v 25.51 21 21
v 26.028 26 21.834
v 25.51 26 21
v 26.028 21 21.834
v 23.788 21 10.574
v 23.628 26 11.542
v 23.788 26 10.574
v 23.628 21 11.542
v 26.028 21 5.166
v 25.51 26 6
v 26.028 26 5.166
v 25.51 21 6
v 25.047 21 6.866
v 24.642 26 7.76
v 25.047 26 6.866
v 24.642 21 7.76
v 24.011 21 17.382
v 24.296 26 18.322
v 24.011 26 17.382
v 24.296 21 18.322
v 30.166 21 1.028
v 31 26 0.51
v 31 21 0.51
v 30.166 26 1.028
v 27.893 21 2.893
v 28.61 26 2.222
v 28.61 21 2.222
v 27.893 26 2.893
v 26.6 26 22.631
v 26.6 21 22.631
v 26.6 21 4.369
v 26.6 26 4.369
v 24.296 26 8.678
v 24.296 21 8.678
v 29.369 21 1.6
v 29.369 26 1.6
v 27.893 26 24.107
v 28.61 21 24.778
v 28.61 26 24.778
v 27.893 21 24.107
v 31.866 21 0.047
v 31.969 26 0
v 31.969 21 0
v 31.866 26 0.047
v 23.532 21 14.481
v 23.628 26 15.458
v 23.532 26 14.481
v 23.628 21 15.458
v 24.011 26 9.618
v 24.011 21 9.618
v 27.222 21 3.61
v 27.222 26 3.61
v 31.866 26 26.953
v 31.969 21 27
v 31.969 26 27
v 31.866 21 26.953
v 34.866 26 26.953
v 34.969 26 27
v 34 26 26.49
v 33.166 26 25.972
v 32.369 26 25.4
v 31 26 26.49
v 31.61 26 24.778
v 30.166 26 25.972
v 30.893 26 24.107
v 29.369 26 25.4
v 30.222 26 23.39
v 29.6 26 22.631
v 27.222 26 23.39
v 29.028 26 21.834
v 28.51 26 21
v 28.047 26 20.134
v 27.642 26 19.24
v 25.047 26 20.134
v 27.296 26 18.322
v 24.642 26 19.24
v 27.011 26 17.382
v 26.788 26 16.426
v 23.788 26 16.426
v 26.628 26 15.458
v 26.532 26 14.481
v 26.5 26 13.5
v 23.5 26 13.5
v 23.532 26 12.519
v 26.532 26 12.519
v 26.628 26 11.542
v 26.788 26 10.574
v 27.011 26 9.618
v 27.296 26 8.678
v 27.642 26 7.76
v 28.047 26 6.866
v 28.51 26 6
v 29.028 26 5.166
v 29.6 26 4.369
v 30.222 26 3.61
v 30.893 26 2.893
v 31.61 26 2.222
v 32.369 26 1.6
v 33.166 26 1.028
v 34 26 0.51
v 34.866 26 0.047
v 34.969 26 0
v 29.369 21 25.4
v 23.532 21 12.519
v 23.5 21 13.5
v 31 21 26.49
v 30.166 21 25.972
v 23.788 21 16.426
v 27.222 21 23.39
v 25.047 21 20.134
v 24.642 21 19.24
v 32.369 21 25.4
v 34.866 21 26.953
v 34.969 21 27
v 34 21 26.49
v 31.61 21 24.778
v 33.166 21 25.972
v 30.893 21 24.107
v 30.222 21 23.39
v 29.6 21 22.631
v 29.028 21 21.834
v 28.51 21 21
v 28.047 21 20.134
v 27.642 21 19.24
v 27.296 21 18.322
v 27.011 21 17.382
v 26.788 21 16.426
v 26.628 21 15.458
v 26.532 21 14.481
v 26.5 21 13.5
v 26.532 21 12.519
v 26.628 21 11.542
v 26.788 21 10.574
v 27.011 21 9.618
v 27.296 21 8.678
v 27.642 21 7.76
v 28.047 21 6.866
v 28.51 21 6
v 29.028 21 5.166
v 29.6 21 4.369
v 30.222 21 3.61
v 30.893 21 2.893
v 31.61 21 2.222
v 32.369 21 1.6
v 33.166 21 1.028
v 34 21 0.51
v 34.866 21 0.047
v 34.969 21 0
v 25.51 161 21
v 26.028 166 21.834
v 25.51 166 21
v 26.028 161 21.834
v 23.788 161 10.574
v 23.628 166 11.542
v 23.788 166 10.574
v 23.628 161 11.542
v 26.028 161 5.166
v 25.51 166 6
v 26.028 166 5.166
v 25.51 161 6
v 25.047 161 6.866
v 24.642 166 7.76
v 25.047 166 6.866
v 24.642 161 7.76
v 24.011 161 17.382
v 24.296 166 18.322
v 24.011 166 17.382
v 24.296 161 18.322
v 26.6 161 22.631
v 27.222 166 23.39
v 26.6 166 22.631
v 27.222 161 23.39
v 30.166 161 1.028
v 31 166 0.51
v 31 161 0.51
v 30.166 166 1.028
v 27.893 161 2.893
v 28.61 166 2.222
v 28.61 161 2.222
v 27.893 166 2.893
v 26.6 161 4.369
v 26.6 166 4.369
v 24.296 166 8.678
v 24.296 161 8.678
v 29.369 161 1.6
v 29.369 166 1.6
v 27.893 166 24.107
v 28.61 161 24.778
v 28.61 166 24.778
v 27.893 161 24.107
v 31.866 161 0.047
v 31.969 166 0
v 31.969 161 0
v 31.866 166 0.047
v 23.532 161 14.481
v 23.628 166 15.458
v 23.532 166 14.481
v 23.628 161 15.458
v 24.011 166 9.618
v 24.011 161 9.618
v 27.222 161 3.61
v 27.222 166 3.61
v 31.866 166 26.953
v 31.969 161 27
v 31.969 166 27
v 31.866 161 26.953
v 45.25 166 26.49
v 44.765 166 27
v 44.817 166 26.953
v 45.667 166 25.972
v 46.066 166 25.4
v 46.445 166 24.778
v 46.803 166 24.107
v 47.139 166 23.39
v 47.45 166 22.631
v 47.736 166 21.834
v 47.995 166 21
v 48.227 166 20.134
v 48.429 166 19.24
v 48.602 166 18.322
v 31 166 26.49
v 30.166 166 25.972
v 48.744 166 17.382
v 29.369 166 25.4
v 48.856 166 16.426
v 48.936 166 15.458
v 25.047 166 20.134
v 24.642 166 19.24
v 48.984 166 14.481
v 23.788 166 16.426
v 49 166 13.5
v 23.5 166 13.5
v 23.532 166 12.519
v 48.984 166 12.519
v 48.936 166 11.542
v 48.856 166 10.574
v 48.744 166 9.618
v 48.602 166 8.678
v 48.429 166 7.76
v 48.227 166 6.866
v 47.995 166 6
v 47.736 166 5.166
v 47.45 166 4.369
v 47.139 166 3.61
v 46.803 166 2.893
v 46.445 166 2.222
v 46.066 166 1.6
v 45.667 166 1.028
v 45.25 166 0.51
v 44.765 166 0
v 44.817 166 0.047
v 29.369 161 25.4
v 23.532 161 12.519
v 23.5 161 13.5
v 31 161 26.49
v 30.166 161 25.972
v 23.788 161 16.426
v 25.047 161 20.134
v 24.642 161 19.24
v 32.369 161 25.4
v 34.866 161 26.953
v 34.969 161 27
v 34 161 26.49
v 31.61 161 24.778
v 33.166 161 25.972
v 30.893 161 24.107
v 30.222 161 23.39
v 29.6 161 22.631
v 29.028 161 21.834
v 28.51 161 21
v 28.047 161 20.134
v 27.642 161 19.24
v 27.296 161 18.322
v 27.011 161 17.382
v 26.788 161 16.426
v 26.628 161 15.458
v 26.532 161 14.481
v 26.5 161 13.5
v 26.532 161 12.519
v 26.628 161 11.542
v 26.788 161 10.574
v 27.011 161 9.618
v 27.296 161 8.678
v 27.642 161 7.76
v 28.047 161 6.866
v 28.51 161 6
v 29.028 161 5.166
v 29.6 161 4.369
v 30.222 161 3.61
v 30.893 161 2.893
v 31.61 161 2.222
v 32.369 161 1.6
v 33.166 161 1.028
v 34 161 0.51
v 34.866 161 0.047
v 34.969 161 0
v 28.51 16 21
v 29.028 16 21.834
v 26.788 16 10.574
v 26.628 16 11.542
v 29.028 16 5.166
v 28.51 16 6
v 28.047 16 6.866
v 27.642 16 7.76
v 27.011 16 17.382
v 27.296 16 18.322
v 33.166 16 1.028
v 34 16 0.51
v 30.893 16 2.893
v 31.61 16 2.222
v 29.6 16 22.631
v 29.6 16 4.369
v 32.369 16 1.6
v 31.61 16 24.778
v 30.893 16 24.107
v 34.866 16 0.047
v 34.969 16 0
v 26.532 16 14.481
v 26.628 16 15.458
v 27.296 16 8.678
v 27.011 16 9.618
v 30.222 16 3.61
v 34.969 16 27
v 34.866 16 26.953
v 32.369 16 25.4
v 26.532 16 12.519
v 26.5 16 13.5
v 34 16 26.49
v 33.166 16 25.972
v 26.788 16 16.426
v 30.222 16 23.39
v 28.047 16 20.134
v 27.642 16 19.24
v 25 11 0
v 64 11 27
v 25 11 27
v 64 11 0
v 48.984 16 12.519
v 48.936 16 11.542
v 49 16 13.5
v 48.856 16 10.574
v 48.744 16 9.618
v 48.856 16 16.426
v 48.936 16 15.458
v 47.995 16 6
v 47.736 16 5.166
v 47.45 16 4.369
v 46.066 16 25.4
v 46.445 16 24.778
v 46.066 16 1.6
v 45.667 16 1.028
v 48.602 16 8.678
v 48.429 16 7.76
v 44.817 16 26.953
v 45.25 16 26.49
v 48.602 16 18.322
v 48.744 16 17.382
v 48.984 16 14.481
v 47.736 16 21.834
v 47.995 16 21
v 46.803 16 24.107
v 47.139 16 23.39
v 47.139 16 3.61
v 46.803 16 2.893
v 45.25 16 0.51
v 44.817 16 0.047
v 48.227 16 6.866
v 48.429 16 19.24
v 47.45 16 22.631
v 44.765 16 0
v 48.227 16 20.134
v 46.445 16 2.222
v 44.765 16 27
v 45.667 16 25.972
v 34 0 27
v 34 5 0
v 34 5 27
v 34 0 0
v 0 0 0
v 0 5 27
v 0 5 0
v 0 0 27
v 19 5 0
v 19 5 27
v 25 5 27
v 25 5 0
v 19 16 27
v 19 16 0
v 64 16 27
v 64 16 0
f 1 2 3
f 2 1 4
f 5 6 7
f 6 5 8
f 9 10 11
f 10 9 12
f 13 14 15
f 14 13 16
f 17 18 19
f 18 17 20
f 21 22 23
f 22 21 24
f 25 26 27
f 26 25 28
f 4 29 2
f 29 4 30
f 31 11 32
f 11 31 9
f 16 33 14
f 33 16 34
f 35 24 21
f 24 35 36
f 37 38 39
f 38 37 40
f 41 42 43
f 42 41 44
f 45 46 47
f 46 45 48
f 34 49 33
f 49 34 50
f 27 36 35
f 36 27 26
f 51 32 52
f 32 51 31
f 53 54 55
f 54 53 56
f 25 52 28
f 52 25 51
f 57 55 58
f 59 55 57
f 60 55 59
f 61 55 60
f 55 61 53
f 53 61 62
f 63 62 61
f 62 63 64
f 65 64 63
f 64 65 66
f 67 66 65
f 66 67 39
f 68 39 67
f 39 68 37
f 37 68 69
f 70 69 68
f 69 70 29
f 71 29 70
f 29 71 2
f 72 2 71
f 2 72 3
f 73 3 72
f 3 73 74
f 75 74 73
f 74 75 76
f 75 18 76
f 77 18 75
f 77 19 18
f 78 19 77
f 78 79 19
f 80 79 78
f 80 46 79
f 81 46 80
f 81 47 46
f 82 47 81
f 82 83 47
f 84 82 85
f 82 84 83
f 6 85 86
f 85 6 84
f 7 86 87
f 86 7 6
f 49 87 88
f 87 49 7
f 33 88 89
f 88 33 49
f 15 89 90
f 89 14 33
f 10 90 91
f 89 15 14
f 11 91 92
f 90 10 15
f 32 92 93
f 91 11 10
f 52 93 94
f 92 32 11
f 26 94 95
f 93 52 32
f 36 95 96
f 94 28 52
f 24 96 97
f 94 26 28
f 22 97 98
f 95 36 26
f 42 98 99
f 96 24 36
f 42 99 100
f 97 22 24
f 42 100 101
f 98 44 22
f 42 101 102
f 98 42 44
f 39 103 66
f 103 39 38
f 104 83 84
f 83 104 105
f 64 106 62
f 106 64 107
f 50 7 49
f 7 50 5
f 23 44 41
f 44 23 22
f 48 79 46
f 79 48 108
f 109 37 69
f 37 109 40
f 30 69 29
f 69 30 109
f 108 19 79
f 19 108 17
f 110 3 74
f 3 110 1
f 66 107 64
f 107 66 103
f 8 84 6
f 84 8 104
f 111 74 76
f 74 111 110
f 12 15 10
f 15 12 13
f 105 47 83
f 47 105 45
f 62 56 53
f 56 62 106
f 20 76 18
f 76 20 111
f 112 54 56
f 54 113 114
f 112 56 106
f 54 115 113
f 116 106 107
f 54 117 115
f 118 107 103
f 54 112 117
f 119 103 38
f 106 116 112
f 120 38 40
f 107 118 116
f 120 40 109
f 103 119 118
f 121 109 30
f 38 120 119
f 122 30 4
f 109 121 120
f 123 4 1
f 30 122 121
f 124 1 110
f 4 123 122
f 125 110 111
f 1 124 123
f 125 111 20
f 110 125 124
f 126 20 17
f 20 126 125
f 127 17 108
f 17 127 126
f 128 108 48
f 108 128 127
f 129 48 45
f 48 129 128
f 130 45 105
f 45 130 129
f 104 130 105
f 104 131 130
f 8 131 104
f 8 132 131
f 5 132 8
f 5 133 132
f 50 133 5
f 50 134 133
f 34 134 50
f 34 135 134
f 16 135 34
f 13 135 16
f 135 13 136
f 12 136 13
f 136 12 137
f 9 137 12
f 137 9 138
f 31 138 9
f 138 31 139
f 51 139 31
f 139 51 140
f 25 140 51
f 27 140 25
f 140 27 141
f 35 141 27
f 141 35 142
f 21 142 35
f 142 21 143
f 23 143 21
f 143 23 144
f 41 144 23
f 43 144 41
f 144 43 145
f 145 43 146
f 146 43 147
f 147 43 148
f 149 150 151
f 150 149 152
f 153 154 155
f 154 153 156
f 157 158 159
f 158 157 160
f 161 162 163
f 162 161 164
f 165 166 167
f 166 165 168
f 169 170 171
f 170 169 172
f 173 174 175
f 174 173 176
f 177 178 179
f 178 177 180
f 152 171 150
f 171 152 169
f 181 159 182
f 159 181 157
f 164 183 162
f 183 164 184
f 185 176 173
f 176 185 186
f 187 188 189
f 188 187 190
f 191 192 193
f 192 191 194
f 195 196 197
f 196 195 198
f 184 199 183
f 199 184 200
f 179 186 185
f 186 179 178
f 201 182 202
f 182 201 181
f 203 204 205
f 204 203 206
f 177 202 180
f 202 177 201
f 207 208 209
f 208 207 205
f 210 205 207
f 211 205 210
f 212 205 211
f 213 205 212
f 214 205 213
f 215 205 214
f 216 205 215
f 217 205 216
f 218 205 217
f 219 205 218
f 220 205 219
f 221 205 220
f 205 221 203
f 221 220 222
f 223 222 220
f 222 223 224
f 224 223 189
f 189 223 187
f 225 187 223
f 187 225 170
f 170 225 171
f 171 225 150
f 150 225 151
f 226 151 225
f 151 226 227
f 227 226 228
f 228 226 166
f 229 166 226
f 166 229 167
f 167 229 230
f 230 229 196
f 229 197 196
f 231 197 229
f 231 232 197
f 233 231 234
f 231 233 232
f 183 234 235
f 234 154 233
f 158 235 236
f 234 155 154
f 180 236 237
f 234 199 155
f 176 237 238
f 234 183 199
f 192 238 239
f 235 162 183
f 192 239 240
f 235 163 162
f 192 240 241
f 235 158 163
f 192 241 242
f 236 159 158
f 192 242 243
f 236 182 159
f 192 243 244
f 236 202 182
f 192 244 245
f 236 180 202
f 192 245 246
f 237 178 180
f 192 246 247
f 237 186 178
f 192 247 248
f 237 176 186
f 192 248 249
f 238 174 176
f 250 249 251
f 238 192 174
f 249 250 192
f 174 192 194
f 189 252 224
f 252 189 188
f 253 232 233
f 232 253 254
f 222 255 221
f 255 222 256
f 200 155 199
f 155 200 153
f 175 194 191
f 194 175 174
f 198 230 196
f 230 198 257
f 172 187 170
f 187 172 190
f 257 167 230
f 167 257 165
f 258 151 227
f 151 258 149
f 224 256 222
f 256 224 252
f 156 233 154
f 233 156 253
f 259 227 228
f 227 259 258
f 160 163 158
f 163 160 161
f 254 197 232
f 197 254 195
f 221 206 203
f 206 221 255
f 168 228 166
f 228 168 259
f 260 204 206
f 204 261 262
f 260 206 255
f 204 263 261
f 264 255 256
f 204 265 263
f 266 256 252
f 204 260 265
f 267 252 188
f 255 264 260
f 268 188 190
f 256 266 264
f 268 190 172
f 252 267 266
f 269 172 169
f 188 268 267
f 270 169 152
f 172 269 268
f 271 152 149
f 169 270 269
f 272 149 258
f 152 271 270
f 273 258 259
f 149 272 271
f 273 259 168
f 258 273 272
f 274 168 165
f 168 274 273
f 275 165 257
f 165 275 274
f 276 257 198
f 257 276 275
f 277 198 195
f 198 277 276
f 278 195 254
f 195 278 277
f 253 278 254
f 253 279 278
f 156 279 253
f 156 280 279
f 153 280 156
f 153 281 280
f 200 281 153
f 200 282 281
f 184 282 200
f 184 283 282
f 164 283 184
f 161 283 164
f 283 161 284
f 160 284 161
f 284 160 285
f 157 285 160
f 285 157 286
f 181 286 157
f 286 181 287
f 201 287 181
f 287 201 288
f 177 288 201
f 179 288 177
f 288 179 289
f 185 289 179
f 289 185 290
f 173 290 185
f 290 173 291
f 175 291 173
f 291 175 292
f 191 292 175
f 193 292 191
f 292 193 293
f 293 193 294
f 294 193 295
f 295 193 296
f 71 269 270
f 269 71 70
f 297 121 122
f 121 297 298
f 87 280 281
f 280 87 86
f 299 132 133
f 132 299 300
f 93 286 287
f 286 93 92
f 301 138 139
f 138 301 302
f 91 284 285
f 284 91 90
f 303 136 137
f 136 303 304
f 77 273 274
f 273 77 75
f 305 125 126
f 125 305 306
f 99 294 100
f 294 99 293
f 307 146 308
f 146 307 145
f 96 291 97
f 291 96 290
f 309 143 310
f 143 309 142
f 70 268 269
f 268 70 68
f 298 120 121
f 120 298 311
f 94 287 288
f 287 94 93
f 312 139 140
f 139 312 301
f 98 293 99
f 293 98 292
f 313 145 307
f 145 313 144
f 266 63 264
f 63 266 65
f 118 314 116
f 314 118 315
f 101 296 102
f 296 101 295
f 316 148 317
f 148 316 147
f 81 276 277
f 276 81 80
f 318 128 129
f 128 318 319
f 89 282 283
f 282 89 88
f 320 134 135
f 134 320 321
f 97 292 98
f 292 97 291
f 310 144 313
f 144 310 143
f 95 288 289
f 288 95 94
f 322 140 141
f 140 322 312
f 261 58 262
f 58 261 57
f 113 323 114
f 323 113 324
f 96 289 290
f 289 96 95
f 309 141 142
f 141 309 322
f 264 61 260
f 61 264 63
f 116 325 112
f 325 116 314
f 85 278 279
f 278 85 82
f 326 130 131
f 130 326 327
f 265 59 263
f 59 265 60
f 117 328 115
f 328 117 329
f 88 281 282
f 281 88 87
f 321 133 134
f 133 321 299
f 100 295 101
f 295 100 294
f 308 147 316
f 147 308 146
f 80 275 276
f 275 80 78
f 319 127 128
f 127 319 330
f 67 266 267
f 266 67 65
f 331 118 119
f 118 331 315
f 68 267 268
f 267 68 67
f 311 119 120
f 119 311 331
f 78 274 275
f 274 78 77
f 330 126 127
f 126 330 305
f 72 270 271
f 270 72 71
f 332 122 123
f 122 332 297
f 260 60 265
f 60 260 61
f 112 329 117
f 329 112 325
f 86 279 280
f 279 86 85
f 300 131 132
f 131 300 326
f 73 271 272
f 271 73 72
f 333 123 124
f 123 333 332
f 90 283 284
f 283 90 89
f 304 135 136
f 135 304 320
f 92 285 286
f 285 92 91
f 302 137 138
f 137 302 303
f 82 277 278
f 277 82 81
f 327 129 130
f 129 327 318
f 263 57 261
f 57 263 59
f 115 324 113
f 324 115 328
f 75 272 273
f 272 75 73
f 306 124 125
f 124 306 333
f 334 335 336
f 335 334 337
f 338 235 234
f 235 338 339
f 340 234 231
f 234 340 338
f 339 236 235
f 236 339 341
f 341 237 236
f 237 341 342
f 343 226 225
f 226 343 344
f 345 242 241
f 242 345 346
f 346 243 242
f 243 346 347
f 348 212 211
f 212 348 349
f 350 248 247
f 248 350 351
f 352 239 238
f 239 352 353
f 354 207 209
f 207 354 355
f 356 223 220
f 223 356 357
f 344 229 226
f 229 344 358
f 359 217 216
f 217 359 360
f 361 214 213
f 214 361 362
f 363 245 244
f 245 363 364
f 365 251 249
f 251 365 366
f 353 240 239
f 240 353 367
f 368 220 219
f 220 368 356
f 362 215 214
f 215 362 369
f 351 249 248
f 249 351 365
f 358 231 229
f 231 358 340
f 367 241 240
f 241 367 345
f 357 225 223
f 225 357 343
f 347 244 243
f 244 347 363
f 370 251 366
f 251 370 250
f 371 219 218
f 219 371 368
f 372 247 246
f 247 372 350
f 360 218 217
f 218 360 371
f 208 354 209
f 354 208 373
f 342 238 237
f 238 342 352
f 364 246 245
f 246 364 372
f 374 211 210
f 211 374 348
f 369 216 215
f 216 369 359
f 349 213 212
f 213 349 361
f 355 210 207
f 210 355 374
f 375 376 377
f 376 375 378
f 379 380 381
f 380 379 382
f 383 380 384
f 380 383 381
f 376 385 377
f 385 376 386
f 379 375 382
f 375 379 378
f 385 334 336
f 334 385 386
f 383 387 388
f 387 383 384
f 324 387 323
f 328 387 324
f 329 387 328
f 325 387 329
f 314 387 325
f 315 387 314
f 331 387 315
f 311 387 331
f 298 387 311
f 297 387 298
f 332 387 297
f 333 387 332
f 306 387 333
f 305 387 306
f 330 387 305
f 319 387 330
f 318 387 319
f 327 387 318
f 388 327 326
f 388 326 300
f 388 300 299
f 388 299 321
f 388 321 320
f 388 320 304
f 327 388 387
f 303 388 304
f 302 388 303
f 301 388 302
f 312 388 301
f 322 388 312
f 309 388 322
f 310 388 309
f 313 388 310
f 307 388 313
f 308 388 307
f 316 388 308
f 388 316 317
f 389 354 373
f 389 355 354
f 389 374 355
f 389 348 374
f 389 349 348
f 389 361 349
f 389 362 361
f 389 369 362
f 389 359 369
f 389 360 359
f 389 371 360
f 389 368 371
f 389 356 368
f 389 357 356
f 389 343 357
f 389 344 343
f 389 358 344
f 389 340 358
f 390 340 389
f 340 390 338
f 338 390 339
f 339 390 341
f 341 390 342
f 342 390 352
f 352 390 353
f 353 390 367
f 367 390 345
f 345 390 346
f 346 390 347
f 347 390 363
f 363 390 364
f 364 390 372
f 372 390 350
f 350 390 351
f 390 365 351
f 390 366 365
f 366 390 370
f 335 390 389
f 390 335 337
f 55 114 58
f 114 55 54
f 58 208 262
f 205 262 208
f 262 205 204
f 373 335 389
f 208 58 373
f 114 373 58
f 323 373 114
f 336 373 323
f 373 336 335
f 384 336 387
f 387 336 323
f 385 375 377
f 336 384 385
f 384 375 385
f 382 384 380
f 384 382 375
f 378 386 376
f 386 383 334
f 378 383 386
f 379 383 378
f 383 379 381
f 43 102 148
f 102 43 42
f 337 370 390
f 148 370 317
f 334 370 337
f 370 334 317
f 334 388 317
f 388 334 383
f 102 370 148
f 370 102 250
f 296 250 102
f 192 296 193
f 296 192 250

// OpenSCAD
// [FL_INDEX: keywords="openscad, 3d_parametric, Customizable_Spool_Holder_for_Replicator_2, csg_solid" | COT="Parametric OpenSCAD design from 3DCodeverse"]
// Title: Customizable Spool Holder for Replicator 2

// Parametric spool holder for MBI R2 by Woale

// preview[view:north west, tilt:top diagonal]

// Unit
unit = 1; // [1:mm,25.4:inch]

// How long should the spool holder be (between ribbons) ?
spool_width = 130;

// What's the size of the spool hole ?
spool_hole_diameter = 30;

//variables
spl_l=spool_width*unit;
spl_d=spool_hole_diameter*unit;

//fix
$fn=48*2;
spl_r=spl_d/2*1;
plt_w=spl_d*1.5*1;

//plate holder
module plt_hld()
{
	//box1
	cube([34,5,spl_d]);
	//box2
	translate([28-9,0,0]) cube([6,16,spl_d]);
	//box3
	translate([28-9,11,0]) cube([plt_w,5,spl_d]);
}

//spool extensions
module spl_ext()
{
	translate([28-9+(plt_w/2)-(spl_r/5),16+5,spl_r]) rotate([270,0,0]) cylinder(5,spl_r,spl_r);
	translate([28-9+(plt_w/2)-(spl_r/5),16+5+spl_l+10,spl_r]) rotate([270,0,0]) cylinder(5,spl_r,spl_r);
}

//spool holder
module spl_hld()
{
	union()
	{
		difference()
		{
			union()
			{
				translate([28-9+(plt_w/2),11,spl_r]) rotate([270,0,0]) cylinder(spl_l+15+10,spl_r,spl_r);
				spl_ext();
			}
			translate([28-9+(plt_w/2),0,0]) cube([spl_d,spl_l+16+25,spl_d]);
		}
	translate([28-9+(plt_w/2),11,spl_r]) rotate([270,0,0]) scale([.5,1,1]) cylinder(spl_l+15+10,spl_r,spl_r);
	}
}

//level
translate([0,0,-spl_r/10]) intersection()
{
	union()
	{
		spl_hld();
		plt_hld();
	}
	translate([0,0,spl_r/10]) cube([28-9+plt_w,spl_l+16+20,spl_d-(spl_r/10*2)]);
}
